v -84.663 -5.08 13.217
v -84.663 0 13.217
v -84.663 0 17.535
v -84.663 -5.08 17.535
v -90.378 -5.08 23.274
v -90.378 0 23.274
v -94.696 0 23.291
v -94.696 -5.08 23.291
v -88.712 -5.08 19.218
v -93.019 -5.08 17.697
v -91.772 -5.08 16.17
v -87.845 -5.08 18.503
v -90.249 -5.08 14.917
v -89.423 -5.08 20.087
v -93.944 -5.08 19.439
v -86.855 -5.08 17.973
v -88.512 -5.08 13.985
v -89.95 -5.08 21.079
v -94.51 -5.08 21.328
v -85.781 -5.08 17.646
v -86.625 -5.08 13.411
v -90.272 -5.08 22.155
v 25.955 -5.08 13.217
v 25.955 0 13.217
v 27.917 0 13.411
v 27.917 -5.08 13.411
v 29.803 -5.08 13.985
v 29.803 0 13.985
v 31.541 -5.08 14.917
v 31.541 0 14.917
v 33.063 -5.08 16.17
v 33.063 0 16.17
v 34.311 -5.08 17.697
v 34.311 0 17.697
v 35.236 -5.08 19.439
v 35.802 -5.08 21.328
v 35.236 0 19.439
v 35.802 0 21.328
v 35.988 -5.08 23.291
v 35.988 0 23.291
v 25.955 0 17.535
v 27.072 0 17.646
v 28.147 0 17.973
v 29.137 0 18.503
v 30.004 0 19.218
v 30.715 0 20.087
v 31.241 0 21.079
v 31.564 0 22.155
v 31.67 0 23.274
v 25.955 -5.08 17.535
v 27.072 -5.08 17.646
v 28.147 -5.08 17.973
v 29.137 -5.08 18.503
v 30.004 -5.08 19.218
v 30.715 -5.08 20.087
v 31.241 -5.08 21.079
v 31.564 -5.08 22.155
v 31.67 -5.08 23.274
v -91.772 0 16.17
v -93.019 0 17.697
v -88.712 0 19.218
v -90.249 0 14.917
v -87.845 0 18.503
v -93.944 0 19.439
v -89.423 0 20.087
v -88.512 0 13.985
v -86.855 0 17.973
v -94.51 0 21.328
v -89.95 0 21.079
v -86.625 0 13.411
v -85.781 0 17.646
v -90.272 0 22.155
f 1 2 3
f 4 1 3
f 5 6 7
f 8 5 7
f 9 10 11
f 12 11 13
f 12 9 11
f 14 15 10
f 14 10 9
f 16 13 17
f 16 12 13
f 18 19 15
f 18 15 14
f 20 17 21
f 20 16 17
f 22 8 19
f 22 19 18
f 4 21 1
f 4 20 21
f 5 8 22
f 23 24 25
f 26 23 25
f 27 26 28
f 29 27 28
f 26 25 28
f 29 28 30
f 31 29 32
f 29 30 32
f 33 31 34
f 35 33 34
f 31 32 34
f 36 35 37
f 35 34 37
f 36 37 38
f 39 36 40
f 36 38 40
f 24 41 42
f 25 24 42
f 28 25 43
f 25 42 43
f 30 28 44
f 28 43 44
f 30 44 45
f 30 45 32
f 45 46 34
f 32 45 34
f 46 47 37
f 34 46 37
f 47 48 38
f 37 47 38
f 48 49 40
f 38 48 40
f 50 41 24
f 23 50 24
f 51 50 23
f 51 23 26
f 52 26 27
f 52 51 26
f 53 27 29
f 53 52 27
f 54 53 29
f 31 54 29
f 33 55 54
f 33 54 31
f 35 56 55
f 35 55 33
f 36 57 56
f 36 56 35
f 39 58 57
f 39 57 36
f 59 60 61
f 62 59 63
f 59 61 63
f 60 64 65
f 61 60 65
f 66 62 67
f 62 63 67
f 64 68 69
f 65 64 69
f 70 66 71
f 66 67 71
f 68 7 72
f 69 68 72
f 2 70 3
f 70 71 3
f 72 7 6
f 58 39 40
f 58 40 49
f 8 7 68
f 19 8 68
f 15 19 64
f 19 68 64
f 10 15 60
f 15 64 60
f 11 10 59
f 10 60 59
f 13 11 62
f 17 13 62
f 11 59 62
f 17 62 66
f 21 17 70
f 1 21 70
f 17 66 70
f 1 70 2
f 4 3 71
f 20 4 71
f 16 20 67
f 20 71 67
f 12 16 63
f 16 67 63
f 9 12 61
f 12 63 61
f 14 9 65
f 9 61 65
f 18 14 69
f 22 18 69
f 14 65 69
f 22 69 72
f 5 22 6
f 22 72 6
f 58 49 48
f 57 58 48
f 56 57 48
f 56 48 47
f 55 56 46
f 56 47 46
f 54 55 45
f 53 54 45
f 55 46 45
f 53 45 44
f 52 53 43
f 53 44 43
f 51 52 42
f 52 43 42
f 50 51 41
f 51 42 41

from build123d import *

# Parameters (mm, degrees)
F1_DEPTH = 5.08
F2_DEPTH = 5.08


with BuildPart() as f1:
    # F0 (on Front) → F1 (new body)
    with BuildSketch(Plane.XZ):
        with BuildLine():
            ThreePointArc((31.669777, 23.273606), (30.003937, 19.21752), (25.95455, 17.535461))
            Line((25.95455, 17.535461), (25.95455, 13.217462))
            ThreePointArc((25.95455, 13.217462), (33.063327, 16.170349), (35.987742, 23.290886))
            Line((35.987742, 23.290886), (31.669777, 23.273606))
        make_face()
    extrude(amount=F1_DEPTH)


with BuildPart() as f2:
    # F0 (on Front) → F2 (new body)
    with BuildSketch(Plane.XZ):
        with BuildLine():
            Line((-84.662786, 13.217462), (-84.662786, 17.535461))
            ThreePointArc((-84.662786, 17.535461), (-88.712172, 19.21752), (-90.378013, 23.273606))
            Line((-90.378013, 23.273606), (-94.695977, 23.290886))
            ThreePointArc((-94.695977, 23.290886), (-91.771562, 16.170349), (-84.662786, 13.217462))
        make_face()
    extrude(amount=F2_DEPTH)


solid = Compound([f1.part, f2.part])
